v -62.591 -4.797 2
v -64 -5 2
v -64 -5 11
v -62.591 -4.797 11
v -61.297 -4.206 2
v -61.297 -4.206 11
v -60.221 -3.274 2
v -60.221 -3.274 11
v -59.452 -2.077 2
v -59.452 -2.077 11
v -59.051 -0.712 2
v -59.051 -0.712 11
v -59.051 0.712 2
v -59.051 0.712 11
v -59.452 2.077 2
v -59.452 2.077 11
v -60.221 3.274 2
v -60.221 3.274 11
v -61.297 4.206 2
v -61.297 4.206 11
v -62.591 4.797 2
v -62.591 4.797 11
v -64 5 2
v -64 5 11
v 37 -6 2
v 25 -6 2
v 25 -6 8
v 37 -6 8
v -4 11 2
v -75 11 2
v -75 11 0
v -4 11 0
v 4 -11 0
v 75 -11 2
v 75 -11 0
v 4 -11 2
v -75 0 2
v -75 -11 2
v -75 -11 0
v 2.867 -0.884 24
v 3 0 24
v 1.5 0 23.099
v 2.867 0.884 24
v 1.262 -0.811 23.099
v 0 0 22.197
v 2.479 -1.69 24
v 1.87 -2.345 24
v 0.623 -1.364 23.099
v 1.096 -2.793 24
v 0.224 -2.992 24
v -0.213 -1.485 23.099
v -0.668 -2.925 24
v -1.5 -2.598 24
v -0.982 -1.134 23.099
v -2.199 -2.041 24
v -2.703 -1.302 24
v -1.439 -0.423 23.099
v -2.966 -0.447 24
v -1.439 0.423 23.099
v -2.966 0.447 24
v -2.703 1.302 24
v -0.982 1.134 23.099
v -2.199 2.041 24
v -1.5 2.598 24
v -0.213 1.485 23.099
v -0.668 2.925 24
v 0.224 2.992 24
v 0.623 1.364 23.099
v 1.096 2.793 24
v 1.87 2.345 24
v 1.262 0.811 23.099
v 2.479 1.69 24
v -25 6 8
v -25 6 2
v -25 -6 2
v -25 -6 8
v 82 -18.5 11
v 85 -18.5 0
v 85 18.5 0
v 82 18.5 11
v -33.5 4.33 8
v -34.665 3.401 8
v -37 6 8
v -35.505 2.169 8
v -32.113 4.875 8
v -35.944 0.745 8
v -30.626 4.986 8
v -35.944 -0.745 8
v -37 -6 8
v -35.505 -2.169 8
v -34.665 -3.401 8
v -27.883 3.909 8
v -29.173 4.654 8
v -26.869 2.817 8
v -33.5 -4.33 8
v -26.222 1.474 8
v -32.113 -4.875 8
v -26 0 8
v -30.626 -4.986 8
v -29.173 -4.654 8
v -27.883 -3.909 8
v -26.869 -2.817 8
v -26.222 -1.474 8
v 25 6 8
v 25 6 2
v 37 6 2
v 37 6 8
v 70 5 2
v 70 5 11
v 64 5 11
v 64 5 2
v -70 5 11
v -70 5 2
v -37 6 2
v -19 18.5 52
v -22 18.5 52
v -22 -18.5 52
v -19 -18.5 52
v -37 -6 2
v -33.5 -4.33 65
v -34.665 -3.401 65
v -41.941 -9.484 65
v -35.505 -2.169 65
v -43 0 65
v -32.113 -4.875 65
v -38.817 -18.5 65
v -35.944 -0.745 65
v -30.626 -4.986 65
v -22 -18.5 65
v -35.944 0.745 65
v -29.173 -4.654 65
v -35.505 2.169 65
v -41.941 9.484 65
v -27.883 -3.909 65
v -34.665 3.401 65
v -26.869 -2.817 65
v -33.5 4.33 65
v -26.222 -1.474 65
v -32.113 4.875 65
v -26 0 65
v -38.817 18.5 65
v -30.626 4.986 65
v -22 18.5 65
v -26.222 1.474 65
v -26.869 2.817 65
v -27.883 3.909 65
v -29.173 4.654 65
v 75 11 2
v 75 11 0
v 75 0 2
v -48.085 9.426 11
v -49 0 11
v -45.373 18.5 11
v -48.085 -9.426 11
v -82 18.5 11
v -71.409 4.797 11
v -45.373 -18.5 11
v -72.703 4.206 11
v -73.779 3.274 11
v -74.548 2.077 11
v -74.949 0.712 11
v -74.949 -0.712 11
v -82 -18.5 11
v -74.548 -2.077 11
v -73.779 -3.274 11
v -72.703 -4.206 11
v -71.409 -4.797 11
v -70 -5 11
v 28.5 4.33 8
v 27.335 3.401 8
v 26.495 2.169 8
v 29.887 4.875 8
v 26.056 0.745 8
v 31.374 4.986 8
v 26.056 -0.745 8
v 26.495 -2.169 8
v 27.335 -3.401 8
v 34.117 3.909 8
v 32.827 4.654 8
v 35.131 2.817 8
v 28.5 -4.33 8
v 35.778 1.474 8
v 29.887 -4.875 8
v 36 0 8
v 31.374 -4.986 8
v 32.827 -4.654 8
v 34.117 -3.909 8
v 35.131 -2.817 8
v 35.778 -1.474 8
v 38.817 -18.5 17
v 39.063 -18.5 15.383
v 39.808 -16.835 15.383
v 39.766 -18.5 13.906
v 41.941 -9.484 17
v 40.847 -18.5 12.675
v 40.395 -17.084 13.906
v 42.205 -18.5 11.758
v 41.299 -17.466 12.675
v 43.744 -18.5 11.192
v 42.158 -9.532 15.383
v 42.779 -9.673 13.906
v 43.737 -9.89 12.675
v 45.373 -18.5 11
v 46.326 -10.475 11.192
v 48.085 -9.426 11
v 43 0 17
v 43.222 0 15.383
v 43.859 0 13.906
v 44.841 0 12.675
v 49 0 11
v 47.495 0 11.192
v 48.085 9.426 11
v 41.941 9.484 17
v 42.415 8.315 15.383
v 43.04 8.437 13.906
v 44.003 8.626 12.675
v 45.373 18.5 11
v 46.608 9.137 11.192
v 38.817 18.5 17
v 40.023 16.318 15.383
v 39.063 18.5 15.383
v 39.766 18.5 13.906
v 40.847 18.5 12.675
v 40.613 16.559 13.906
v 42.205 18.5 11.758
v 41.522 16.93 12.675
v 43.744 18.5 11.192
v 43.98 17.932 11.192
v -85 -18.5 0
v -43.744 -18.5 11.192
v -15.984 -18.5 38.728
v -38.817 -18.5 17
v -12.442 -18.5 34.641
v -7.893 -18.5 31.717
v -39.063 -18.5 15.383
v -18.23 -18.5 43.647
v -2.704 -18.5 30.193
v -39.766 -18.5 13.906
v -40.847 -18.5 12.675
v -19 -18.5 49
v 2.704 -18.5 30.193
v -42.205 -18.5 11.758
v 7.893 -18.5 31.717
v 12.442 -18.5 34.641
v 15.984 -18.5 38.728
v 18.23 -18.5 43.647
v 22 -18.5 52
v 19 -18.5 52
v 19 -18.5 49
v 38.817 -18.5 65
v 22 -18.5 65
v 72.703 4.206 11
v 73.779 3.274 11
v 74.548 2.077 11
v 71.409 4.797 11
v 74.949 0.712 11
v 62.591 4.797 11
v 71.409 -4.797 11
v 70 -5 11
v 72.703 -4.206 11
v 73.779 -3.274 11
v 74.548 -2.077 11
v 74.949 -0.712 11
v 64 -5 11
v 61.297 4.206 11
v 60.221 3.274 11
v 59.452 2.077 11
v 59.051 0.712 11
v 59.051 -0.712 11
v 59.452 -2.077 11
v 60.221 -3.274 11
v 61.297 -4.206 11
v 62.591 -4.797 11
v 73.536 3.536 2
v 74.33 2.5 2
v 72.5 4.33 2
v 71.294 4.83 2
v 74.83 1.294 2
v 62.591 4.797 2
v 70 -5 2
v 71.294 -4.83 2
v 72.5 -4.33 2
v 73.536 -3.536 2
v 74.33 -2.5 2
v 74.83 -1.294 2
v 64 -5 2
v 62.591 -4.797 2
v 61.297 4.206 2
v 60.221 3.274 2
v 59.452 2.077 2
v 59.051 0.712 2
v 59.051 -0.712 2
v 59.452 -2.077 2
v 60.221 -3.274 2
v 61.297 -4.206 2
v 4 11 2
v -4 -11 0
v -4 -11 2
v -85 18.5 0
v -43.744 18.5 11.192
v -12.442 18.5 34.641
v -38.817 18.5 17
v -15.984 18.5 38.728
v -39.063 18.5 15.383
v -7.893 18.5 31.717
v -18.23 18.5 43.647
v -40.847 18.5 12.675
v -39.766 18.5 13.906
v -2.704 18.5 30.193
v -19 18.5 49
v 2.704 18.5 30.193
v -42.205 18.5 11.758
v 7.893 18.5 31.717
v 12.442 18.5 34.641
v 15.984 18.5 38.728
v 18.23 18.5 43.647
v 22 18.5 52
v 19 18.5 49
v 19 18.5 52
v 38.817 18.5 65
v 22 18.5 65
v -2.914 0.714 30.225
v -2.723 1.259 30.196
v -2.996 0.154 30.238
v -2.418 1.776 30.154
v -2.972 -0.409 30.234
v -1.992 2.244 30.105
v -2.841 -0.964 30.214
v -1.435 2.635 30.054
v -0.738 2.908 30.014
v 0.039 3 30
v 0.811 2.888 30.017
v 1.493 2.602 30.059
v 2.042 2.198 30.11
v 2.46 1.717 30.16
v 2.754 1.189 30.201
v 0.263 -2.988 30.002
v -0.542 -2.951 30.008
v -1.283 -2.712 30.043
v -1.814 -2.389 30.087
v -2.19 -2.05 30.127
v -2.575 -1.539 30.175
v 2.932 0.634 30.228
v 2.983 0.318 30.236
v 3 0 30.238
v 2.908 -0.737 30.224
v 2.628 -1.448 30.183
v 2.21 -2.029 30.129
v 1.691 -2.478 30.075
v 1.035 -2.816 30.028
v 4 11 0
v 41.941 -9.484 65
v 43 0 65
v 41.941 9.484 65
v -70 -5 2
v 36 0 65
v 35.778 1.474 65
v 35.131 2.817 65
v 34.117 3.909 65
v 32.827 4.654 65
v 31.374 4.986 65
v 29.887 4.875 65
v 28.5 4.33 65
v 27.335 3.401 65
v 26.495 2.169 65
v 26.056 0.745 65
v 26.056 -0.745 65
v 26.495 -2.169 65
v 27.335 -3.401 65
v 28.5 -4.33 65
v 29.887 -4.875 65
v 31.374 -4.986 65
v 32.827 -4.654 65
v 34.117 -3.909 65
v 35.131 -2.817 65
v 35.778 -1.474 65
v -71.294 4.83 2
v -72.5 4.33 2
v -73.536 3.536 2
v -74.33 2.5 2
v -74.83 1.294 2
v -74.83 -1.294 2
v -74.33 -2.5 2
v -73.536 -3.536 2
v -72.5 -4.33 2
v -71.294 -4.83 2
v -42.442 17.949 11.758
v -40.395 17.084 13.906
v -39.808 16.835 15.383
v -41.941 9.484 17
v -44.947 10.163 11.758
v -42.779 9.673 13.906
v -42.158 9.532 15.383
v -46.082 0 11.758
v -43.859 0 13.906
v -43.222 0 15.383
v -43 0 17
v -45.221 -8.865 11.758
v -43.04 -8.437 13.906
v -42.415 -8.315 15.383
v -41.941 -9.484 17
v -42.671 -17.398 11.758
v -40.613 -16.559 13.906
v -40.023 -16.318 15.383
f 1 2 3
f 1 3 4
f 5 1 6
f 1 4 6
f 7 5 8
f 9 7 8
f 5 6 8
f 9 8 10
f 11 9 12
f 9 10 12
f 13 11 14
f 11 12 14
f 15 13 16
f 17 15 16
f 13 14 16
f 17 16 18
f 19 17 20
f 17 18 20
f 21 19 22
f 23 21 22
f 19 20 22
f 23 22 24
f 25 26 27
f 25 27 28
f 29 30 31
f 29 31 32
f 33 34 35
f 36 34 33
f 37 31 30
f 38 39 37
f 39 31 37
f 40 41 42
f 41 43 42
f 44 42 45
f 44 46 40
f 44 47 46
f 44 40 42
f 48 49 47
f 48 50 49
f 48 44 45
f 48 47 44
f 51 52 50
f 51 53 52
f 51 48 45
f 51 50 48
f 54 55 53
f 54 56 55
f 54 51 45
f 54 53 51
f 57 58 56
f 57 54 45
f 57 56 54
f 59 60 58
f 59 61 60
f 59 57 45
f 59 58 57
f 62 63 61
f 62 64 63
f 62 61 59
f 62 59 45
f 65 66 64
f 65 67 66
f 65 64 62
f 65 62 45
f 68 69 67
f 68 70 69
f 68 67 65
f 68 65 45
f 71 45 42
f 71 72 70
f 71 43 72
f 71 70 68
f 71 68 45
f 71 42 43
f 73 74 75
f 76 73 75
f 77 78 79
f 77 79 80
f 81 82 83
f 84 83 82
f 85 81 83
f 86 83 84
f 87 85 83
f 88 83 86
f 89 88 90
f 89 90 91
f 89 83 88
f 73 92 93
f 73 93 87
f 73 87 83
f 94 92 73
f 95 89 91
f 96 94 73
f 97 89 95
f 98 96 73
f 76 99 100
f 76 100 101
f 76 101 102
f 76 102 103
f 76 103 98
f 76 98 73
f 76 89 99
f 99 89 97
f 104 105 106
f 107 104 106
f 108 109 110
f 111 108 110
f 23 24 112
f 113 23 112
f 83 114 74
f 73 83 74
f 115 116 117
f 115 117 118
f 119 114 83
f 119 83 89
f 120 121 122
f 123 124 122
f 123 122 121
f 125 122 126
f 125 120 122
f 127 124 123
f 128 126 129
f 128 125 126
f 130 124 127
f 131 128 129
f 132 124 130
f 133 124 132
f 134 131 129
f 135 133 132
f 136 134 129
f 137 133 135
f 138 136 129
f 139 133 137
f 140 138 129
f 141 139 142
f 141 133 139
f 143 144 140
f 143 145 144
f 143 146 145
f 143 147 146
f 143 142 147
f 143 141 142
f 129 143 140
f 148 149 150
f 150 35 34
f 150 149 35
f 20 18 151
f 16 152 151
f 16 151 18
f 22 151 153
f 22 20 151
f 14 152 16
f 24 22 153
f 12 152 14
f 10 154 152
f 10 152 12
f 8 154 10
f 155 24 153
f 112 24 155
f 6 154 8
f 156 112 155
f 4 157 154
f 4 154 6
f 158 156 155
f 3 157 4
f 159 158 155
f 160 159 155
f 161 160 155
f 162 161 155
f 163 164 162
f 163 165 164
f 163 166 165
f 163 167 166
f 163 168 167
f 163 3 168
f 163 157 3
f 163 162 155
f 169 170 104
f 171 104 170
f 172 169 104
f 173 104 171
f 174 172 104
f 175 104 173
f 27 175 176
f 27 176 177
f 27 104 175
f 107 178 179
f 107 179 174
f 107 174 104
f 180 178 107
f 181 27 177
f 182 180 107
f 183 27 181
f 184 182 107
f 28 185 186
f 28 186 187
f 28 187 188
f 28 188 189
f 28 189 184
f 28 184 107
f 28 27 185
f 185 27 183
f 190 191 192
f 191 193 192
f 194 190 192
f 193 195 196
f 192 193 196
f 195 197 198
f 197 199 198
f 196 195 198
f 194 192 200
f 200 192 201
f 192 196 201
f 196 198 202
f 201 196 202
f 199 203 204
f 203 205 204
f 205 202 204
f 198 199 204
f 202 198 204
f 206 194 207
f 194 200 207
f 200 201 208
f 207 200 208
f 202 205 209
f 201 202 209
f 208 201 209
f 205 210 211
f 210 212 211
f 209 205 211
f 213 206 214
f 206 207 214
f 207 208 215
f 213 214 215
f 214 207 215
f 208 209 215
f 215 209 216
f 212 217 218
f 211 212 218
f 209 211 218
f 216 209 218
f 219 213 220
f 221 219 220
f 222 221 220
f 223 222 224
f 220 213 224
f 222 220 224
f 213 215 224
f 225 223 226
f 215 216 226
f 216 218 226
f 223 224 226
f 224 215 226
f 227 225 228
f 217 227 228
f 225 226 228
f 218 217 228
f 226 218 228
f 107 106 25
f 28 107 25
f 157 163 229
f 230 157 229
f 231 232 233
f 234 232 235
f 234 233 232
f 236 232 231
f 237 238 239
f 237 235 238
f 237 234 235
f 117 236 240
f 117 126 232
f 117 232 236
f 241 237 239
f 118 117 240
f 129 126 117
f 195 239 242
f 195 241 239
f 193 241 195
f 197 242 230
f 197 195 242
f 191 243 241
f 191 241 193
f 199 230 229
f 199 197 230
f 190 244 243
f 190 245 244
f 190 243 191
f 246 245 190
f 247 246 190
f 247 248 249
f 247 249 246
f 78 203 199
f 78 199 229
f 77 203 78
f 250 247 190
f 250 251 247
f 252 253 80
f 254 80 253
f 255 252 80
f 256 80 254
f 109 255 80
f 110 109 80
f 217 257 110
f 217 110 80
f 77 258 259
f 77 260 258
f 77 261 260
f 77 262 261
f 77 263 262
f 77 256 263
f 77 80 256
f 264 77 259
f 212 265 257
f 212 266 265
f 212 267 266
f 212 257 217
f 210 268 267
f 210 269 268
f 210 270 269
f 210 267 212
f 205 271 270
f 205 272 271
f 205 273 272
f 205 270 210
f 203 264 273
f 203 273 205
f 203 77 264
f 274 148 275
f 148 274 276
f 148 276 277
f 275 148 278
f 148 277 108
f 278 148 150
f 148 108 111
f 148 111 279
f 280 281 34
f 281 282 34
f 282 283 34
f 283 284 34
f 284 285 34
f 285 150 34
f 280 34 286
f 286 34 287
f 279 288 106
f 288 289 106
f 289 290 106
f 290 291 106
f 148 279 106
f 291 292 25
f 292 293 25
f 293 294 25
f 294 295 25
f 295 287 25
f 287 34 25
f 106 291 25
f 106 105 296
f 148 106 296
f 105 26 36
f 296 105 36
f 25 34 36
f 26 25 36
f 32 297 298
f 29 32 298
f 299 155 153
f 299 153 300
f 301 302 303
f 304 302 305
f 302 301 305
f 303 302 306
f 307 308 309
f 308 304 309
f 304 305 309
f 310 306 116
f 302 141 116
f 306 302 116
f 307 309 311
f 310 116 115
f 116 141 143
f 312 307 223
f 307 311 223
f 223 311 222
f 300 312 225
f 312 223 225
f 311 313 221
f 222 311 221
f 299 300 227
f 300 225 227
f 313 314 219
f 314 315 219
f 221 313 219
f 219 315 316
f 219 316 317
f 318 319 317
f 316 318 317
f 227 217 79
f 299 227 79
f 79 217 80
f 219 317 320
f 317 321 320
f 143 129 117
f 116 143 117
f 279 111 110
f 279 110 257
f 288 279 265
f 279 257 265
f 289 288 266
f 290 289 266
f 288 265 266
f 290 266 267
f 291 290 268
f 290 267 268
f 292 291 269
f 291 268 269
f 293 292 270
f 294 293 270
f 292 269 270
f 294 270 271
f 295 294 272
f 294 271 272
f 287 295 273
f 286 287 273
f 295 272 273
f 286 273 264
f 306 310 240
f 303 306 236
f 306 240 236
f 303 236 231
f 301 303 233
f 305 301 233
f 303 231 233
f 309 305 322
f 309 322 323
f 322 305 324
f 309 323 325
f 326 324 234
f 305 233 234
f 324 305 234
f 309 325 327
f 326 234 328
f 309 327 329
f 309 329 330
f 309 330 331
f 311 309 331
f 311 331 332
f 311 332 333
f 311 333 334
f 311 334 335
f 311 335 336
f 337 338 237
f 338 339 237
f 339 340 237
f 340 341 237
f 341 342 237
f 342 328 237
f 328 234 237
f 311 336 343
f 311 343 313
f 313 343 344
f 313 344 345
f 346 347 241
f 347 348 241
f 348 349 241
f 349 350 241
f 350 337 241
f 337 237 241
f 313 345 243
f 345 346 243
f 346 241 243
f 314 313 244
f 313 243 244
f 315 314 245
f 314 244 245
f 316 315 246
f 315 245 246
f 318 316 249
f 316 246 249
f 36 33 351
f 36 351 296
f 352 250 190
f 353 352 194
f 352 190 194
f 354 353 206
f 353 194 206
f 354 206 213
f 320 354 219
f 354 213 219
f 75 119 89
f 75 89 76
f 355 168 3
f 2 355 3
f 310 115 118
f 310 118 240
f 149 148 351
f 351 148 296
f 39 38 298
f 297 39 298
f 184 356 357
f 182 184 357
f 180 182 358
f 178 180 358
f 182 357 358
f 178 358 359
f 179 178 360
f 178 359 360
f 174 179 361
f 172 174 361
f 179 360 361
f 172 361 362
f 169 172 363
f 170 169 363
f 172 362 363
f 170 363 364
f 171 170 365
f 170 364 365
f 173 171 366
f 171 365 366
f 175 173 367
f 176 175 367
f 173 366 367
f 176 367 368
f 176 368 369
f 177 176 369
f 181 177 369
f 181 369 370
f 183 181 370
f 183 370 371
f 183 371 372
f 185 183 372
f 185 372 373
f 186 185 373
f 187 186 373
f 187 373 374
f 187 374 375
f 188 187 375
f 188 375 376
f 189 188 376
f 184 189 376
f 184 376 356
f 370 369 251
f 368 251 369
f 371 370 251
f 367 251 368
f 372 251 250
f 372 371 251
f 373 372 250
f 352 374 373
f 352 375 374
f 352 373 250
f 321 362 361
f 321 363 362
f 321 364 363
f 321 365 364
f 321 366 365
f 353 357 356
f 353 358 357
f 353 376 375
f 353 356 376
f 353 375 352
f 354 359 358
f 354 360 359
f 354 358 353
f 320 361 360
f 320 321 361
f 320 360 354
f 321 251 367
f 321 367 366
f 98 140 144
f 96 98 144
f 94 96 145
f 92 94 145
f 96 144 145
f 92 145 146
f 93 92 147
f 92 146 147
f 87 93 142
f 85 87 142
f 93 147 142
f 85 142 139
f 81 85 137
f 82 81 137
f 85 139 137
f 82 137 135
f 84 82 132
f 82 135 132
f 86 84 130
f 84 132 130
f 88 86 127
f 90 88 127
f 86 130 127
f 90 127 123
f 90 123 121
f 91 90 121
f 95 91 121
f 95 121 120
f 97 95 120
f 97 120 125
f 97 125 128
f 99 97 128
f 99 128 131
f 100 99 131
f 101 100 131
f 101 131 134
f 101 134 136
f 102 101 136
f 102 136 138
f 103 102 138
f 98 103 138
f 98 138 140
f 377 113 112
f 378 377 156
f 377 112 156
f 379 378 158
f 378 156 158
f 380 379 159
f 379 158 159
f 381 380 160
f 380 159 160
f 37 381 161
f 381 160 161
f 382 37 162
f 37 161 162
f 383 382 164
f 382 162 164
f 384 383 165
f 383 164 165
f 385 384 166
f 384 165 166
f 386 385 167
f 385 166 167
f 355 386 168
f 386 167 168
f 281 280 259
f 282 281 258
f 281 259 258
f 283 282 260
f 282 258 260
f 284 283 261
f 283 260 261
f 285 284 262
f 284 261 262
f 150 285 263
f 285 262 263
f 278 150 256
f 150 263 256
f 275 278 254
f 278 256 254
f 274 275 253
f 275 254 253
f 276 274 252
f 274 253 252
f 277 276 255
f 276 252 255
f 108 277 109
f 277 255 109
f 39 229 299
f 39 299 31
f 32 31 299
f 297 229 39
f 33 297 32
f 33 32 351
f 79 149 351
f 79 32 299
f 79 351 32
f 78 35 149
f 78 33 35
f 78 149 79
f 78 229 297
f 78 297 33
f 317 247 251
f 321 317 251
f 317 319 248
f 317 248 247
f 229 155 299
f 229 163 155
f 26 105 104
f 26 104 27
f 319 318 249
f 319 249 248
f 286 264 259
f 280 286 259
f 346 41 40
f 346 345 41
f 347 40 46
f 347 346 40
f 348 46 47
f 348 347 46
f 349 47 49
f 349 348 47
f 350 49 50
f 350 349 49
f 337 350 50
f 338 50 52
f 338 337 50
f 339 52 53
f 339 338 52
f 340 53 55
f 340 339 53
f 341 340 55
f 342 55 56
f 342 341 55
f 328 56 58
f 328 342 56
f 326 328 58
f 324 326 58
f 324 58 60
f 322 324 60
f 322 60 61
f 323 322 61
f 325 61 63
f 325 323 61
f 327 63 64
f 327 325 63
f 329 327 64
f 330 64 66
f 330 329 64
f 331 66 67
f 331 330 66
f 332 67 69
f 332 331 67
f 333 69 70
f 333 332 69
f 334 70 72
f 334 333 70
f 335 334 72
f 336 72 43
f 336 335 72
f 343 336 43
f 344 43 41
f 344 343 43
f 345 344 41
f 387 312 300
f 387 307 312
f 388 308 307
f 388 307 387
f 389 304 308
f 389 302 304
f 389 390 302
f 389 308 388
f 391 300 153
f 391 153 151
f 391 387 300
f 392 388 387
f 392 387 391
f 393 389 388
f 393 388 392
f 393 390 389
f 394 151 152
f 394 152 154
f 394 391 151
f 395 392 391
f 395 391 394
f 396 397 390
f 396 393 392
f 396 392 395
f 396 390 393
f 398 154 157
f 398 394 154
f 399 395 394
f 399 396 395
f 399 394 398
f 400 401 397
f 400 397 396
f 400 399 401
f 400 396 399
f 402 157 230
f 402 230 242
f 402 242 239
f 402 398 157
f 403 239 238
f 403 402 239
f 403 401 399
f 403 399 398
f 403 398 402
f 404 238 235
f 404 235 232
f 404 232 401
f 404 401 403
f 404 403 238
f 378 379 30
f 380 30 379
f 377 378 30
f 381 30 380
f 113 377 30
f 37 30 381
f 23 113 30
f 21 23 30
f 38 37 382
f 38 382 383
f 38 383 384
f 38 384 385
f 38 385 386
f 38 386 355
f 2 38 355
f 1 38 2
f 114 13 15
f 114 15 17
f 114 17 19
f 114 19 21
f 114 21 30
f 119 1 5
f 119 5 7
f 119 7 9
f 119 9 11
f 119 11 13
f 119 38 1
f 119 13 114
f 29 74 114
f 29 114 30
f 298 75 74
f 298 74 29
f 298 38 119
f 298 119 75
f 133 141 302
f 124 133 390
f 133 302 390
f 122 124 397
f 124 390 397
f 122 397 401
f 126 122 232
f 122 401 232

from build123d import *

# Parameters (mm, degrees)
F1_DEPTH  = 18.5
F3_DEPTH  = 54
F5_DEPTH  = 48.5
F6_R      = 5
F7_DEPTH  = 65.001
F8_W      = 12
F8_H      = 12
F9_DEPTH  = 8
F10_W     = 71
F10_H     = 2
F11_DEPTH = 11
F13_DEPTH = 11.001
F17_R     = 6


# Not quite as in the source:
# - a pattern or mirror of a feature is missing from the dataset's text; its kind, count and spacing are read off the source's solid


with BuildPart() as f1:
    # F0 (on Front) → F1 (new body, symmetric)
    with BuildSketch(Plane.XZ):
        Polygon((-82, 11), (-85, 0), (85, 0), (82, 11), align=None)
    extrude(amount=F1_DEPTH, both=True)

    # F2 (on face) → F3 (join)
    with BuildSketch(Plane.XY.offset(11)):
        with BuildLine():
            Line((38.8168777724, 18.5), (-38.8168777724, 18.5))
            ThreePointArc((-38.8168777724, 18.5), (-43, 0), (-38.8168777724, -18.5))
            Line((-38.8168777724, -18.5), (38.8168777724, -18.5))
            ThreePointArc((38.8168777724, -18.5), (43, 0), (38.8168777724, 18.5))
        make_face()
    extrude(amount=F3_DEPTH)

    # F4 (on Front) → F5 (cut, symmetric)
    with BuildSketch(Plane.XZ):
        with BuildLine():
            Line((22, 65), (-22, 65))
            Line((-22, 65), (-22, 52))
            Line((-22, 52), (-19, 52))
            Line((-19, 52), (-19, 49))
            ThreePointArc((-19, 49), (0, 30), (19, 49))
            Line((19, 49), (19, 52))
            Line((19, 52), (22, 52))
            Line((22, 52), (22, 65))
        make_face()
    extrude(amount=F5_DEPTH, both=True, mode=Mode.SUBTRACT)

    # F6 (on face) → F7 (cut, through all)
    with BuildSketch(Plane.XY.offset(65)):
        with Locations((-31, 0)):
            Circle(F6_R)
        with Locations((31, 0)):
            Circle(F6_R)
    extrude(amount=-F7_DEPTH, mode=Mode.SUBTRACT)

    # F8 (on face) → F9 (cut)
    with BuildSketch(Plane(origin=(0, 0, 0), x_dir=(1, 0, 0), z_dir=(0, 0, -1))):
        with Locations((-31, 0)):
            Rectangle(F8_W, F8_H)
        with Locations((31, 0)):
            Rectangle(F8_W, F8_H)
    extrude(amount=-F9_DEPTH, mode=Mode.SUBTRACT)

    # F10 (on Front) → F11 (cut, symmetric)
    with BuildSketch(Plane.XZ):
        with Locations((-39.5, 1)):
            Rectangle(F10_W, F10_H)
    f11 = extrude(amount=F11_DEPTH, both=True, mode=Mode.SUBTRACT)

    # F11_copies: F11 across plane
    add(f11.mirror(Plane(origin=(0, 0, 0), x_dir=(0, 0, 1), z_dir=(1, 0, 0))), mode=Mode.SUBTRACT)

    # F12 (on face) → F13 (cut, through all)
    with BuildSketch(Plane.XY.offset(11)):
        with BuildLine():
            ThreePointArc((-70, 5), (-75, 0), (-70, -5))
            Line((-70, -5), (-64, -5))
            ThreePointArc((-64, -5), (-59, 0), (-64, 5))
            Line((-64, 5), (-70, 5))
        make_face()
        with BuildLine():
            ThreePointArc((70, -5), (75, 0), (70, 5))
            Line((70, 5), (64, 5))
            ThreePointArc((64, 5), (59, 0), (64, -5))
            Line((64, -5), (70, -5))
        make_face()
    extrude(amount=-F13_DEPTH, mode=Mode.SUBTRACT)

    # F14 (on Front) → F15 (revolve, cut)
    with BuildSketch(Plane.XZ):
        Polygon((3, 31.8085759505), (0, 31.8085759505), (0, 22.1974181429), (3, 24), align=None)
    revolve(axis=Axis((0, 0, 27.0029970467), (0, 0, -1)), mode=Mode.SUBTRACT)

    # F14 (on Front) → F16 (revolve, cut)
    with BuildSketch(Plane.XZ):
        Polygon((3, 31.8085759505), (0, 31.8085759505), (0, 22.1974181429), (3, 24), align=None)
    revolve(axis=Axis((0, 0, 27.0029970467), (0, 0, -1)), mode=Mode.SUBTRACT)

    # F17
    f17_edges = [f1.edges().sort_by_distance(p)[0] for p in [
        (43, 0, 11),
        (-43, 0, 11),
    ]]
    fillet(f17_edges, radius=F17_R)


solid = f1.part
